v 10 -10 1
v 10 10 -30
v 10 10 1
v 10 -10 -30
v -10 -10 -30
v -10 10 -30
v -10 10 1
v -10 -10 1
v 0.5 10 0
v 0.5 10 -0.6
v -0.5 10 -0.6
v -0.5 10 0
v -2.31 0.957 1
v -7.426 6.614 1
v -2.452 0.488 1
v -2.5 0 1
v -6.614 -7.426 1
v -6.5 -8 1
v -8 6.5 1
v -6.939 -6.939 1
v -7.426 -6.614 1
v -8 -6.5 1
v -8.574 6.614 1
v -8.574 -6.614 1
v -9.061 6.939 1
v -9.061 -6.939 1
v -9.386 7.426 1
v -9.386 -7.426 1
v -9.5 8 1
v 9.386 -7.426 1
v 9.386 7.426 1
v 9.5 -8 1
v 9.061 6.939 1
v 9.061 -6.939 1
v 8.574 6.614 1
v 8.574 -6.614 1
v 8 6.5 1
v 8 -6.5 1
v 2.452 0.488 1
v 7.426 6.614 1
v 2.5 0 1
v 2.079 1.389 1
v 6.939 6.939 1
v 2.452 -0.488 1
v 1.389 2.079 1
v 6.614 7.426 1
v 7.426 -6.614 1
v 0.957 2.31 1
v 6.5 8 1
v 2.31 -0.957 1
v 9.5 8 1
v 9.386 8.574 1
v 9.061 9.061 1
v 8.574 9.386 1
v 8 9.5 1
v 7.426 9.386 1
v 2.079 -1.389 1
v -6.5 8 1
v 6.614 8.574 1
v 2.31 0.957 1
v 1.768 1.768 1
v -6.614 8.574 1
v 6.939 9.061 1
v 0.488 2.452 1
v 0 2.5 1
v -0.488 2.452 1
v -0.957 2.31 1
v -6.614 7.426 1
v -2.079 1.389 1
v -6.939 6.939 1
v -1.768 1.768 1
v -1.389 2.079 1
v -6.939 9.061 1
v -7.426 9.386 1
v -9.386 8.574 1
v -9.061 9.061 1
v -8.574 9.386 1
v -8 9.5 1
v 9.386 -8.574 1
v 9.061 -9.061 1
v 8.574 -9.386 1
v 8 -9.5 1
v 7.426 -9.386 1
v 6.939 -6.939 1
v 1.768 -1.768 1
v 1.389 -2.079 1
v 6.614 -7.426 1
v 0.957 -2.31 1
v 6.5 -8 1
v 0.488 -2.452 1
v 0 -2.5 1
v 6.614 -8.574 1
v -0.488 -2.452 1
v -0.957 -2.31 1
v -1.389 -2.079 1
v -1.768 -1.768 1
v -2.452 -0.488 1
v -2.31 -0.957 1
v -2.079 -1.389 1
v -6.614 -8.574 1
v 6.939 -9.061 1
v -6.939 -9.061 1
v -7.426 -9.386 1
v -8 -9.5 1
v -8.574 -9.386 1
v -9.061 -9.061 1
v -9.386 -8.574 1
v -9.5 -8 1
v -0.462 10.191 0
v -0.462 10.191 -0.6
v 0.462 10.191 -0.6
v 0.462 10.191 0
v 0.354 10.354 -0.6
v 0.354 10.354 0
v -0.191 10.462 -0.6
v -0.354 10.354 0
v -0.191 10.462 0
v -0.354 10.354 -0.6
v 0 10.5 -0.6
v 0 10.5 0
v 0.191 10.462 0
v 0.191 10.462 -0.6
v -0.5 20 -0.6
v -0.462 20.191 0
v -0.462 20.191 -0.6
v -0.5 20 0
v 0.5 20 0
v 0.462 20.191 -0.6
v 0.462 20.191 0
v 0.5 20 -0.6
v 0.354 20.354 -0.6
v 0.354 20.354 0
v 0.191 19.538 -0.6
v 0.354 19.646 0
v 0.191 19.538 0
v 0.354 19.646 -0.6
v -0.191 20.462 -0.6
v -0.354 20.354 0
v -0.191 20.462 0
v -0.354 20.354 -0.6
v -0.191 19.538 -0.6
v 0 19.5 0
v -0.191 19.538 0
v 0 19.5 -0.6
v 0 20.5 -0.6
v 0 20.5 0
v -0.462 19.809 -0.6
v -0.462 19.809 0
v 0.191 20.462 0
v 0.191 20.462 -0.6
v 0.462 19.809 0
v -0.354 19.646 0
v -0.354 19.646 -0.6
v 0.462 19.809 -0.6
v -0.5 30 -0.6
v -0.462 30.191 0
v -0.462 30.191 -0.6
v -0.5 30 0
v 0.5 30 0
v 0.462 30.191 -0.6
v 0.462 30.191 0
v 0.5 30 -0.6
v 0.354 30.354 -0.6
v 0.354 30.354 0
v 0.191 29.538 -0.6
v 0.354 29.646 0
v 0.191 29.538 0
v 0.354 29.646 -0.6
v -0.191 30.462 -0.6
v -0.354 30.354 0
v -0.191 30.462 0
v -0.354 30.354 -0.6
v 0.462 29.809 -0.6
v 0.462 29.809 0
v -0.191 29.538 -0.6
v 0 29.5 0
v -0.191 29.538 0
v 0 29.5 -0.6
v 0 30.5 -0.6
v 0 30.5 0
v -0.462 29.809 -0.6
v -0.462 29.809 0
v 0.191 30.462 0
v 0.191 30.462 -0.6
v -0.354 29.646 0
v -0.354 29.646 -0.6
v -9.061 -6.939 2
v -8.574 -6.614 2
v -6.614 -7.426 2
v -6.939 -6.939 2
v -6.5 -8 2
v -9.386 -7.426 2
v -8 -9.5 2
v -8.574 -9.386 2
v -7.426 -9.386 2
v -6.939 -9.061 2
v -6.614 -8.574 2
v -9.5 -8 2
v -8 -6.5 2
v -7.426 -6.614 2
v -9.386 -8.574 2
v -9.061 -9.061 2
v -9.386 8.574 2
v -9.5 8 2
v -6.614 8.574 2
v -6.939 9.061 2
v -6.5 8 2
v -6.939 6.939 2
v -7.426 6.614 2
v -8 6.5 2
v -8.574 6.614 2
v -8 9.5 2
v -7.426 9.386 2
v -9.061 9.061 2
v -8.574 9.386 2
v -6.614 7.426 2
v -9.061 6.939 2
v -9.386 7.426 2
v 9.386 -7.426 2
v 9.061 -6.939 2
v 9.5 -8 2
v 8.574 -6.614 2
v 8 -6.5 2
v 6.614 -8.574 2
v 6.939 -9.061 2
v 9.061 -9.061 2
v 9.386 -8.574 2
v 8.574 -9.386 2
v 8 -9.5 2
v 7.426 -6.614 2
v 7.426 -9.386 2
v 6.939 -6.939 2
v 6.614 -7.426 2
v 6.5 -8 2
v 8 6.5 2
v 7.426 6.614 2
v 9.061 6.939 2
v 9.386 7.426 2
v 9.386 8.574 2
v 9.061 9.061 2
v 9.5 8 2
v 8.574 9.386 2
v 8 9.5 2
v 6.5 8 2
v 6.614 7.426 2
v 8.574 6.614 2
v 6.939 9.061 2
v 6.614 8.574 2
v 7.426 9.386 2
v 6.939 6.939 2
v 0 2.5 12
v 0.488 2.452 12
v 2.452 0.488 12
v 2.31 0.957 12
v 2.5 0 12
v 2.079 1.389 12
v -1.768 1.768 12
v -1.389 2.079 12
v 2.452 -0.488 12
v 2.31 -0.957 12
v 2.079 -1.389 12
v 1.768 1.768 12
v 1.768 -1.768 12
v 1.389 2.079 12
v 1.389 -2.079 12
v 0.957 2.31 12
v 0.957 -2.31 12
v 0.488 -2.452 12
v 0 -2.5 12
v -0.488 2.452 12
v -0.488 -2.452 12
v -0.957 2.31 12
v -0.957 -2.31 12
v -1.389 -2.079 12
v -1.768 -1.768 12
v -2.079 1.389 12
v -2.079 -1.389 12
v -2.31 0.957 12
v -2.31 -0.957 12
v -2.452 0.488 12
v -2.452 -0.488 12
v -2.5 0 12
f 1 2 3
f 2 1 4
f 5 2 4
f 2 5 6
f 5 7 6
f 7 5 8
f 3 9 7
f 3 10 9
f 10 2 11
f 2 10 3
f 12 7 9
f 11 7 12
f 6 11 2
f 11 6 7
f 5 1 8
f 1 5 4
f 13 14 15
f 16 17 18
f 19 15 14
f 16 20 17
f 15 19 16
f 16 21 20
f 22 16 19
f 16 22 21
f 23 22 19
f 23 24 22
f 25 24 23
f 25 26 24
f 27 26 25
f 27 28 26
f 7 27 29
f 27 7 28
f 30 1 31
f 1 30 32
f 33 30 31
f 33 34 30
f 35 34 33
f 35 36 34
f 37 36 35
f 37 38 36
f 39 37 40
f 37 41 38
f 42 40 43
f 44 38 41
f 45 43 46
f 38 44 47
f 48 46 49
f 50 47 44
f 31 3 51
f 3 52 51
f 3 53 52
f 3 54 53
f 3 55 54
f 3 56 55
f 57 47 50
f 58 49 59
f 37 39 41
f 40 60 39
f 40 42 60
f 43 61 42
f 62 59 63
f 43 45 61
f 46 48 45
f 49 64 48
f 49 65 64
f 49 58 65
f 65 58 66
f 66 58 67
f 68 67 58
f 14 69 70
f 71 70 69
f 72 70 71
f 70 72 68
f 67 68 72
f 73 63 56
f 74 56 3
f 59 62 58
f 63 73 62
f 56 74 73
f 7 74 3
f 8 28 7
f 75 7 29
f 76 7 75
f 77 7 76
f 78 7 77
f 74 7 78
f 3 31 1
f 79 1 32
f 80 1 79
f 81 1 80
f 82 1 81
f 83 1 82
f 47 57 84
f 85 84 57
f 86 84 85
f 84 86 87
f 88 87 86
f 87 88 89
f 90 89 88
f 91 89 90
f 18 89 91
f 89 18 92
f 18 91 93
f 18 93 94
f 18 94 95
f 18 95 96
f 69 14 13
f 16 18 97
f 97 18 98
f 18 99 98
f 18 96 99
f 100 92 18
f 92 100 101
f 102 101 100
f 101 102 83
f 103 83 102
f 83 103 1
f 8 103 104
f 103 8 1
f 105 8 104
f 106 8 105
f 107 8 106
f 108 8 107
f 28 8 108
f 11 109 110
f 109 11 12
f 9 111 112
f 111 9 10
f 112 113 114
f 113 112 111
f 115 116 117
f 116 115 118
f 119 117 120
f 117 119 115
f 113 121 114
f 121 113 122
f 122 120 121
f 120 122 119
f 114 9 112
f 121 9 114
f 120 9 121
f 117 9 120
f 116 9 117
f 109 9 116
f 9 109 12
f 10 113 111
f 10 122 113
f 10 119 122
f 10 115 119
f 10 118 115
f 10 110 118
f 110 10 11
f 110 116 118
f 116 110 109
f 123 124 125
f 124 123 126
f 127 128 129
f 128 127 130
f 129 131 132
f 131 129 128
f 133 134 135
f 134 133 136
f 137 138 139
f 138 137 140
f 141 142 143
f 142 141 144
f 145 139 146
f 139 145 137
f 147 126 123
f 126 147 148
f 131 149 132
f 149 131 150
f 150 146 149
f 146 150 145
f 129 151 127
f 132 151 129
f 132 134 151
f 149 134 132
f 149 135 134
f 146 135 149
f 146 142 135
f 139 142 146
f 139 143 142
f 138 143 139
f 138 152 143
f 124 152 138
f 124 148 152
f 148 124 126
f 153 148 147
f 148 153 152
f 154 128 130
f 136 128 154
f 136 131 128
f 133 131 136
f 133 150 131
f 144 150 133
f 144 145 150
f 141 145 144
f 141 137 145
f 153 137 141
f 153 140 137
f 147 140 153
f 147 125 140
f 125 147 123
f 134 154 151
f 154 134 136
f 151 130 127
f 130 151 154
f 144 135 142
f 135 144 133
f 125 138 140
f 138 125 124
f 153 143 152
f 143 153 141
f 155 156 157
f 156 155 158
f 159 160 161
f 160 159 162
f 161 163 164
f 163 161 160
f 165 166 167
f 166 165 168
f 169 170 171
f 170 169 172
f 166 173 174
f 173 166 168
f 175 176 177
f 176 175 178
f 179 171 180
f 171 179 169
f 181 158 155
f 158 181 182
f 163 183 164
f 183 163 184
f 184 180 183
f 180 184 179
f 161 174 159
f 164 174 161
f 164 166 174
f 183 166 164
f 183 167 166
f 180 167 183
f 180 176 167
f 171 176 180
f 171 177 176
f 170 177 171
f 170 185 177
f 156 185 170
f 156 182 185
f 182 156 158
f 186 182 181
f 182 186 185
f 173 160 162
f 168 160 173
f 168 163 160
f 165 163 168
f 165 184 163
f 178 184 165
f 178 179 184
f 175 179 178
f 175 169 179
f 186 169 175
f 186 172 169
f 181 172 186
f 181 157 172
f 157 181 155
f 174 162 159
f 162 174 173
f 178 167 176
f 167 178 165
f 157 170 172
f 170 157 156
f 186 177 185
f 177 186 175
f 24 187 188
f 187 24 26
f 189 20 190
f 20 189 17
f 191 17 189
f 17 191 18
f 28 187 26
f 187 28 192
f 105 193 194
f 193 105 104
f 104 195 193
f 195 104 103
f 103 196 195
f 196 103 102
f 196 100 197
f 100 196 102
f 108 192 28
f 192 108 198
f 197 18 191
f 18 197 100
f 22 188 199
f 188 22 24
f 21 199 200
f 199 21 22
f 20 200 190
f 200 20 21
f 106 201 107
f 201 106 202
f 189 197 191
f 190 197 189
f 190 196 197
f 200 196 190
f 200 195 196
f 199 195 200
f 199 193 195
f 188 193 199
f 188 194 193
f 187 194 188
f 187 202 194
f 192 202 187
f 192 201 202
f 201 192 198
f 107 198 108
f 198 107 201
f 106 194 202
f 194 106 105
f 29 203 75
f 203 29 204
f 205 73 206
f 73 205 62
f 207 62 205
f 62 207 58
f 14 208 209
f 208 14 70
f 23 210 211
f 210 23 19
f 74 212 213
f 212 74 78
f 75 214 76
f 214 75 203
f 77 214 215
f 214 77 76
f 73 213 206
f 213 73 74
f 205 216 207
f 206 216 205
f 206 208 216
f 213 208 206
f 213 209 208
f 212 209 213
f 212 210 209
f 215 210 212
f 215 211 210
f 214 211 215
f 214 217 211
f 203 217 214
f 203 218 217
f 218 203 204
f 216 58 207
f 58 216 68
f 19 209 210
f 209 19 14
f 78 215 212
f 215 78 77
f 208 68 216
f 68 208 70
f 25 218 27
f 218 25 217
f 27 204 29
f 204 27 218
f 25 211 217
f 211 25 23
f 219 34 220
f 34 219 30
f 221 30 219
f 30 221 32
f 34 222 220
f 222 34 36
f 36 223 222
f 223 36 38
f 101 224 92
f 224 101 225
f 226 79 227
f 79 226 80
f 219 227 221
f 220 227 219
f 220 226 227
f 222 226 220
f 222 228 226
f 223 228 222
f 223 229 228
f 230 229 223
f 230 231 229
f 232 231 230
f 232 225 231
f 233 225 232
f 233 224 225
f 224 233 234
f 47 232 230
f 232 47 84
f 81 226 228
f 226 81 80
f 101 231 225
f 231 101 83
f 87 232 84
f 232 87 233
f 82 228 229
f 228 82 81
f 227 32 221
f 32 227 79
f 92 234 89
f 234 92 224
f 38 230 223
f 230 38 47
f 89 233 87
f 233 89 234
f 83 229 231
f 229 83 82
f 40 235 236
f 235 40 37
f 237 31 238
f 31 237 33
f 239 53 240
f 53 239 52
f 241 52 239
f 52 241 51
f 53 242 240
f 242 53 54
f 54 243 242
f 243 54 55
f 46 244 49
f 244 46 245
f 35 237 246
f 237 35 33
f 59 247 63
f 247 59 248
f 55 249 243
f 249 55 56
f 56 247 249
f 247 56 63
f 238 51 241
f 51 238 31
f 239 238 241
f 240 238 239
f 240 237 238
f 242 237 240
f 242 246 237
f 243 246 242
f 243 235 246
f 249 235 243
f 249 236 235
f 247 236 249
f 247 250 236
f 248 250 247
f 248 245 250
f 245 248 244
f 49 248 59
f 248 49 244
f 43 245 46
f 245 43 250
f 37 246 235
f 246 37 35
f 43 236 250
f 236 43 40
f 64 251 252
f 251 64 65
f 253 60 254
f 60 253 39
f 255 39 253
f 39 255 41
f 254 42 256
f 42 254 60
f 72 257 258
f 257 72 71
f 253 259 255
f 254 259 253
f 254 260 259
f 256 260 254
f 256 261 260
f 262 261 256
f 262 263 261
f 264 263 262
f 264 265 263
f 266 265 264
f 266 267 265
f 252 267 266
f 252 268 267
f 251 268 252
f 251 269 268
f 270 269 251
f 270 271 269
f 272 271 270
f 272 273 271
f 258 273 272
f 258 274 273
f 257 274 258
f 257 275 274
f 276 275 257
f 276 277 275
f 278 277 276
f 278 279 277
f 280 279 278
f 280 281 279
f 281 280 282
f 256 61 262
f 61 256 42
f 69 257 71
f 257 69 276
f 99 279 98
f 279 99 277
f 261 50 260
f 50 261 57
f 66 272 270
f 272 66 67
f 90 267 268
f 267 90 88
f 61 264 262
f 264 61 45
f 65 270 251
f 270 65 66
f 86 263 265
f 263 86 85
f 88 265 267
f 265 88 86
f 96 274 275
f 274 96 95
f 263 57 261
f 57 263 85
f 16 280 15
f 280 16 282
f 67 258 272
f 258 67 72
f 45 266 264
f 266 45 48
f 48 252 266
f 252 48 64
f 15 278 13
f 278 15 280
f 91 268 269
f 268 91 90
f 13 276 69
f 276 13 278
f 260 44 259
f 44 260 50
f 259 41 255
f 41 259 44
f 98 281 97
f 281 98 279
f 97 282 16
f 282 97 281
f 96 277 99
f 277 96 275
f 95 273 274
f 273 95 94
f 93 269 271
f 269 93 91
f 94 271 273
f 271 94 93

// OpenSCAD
// Parameters
face_width_mm = 20; //[10:40:0.5]
front_face_thickness_mm = 2; //[1:6:0.5]
body_length_mm = 30; //[15:60:0.5]
body_width_mm = 20; //[10:40:0.5]
body_height_mm = 20; //[10:40:0.5]
shaft_diameter_mm = 5; //[2.5:10:0.1]
shaft_length_mm = 12; //[6:24:0.5]
mounting_hole_spacing_mm = 16; //[8:32:0.5]
mounting_hole_diameter_mm = 3; //[1.5:6:0.1]
overlap_mm = 1; //[0.5:2:0.1]
ttrack_length_mm = 30; //[15:60:0.5]
ttrack_pitch_mm = 10; //[5:20:0.5]
ttrack_num_insert_holes = 3; //[1:10:1]
pattern_marker_diameter_mm = 1; //[0.5:2:0.1]
pattern_marker_height_mm = 0.6; //[0.3:2:0.1]

// Motor Shaft
module motor_shaft() {
  color("Silver") {
    translate([0, 0, front_face_thickness_mm/2 + shaft_length_mm/2 - overlap_mm])
      cylinder(d=shaft_diameter_mm, h=shaft_length_mm, center=true, $fn=32);
  }
}

// Ttrack Hole Positions
module ttrack_hole_positions() {
  color("DimGray") {
    for (i = [1:ttrack_num_insert_holes]) {
      translate([0, i * ttrack_pitch_mm, -(front_face_thickness_mm/2 + pattern_marker_height_mm/2 - overlap_mm)])
        cylinder(d=pattern_marker_diameter_mm, h=pattern_marker_height_mm, center=true, $fn=16);
    }
  }
}

// Ttrack Insert Hole Positions
module ttrack_insert_hole_positions() {
  color("DimGray") {
    for (i = [1:ttrack_num_insert_holes]) {
      translate([ttrack_length_mm/2 - i * (ttrack_length_mm/(ttrack_num_insert_holes+1)), 0, -(front_face_thickness_mm/2 + pattern_marker_height_mm/2 - overlap_mm)])
        cylinder(d=pattern_marker_diameter_mm, h=pattern_marker_height_mm, center=true, $fn=16);
    }
  }
}

// Rail Hole Positions
module rail_hole_positions() {
  color("DimGray") {
    translate([face_width_mm/2 - pattern_marker_diameter_mm/2, 0, -(front_face_thickness_mm/2 + pattern_marker_height_mm/2 - overlap_mm)])
      cylinder(d=pattern_marker_diameter_mm, h=pattern_marker_height_mm, center=true, $fn=16);
    translate([-(face_width_mm/2 - pattern_marker_diameter_mm/2), 0, -(front_face_thickness_mm/2 + pattern_marker_height_mm/2 - overlap_mm)])
      cylinder(d=pattern_marker_diameter_mm, h=pattern_marker_height_mm, center=true, $fn=16);
  }
}

// Grill Hole Positions
module grill_hole_positions() {
  color("DimGray") {
    translate([0, face_width_mm/4, -(front_face_thickness_mm/2 + pattern_marker_height_mm/2 - overlap_mm)])
      cylinder(d=pattern_marker_diameter_mm, h=pattern_marker_height_mm, center=true, $fn=16);
    translate([0, -face_width_mm/4, -(front_face_thickness_mm/2 + pattern_marker_height_mm/2 - overlap_mm)])
      cylinder(d=pattern_marker_diameter_mm, h=pattern_marker_height_mm, center=true, $fn=16);
  }
}

// Assembly
module assembly() {
  color("Black") {
    // Motor Body
    translate([0, 0, -(front_face_thickness_mm/2 + body_length_mm/2 - overlap_mm)])
      cube([body_width_mm, body_height_mm, body_length_mm], center=true);
    // Front Face
    translate([0, 0, 0])
      cube([face_width_mm, face_width_mm, front_face_thickness_mm], center=true);
  }
  motor_shaft();
  ttrack_hole_positions();
  ttrack_insert_hole_positions();
  rail_hole_positions();
  grill_hole_positions();
  
  // Mounting Holes
  color("Silver") {
    for (x = [-1, 1], y = [-1, 1]) {
      translate([x * mounting_hole_spacing_mm/2, y * mounting_hole_spacing_mm/2, 0])
        cylinder(d=mounting_hole_diameter_mm, h=front_face_thickness_mm + 2*overlap_mm, center=true, $fn=16);
    }
  }
}

assembly();
